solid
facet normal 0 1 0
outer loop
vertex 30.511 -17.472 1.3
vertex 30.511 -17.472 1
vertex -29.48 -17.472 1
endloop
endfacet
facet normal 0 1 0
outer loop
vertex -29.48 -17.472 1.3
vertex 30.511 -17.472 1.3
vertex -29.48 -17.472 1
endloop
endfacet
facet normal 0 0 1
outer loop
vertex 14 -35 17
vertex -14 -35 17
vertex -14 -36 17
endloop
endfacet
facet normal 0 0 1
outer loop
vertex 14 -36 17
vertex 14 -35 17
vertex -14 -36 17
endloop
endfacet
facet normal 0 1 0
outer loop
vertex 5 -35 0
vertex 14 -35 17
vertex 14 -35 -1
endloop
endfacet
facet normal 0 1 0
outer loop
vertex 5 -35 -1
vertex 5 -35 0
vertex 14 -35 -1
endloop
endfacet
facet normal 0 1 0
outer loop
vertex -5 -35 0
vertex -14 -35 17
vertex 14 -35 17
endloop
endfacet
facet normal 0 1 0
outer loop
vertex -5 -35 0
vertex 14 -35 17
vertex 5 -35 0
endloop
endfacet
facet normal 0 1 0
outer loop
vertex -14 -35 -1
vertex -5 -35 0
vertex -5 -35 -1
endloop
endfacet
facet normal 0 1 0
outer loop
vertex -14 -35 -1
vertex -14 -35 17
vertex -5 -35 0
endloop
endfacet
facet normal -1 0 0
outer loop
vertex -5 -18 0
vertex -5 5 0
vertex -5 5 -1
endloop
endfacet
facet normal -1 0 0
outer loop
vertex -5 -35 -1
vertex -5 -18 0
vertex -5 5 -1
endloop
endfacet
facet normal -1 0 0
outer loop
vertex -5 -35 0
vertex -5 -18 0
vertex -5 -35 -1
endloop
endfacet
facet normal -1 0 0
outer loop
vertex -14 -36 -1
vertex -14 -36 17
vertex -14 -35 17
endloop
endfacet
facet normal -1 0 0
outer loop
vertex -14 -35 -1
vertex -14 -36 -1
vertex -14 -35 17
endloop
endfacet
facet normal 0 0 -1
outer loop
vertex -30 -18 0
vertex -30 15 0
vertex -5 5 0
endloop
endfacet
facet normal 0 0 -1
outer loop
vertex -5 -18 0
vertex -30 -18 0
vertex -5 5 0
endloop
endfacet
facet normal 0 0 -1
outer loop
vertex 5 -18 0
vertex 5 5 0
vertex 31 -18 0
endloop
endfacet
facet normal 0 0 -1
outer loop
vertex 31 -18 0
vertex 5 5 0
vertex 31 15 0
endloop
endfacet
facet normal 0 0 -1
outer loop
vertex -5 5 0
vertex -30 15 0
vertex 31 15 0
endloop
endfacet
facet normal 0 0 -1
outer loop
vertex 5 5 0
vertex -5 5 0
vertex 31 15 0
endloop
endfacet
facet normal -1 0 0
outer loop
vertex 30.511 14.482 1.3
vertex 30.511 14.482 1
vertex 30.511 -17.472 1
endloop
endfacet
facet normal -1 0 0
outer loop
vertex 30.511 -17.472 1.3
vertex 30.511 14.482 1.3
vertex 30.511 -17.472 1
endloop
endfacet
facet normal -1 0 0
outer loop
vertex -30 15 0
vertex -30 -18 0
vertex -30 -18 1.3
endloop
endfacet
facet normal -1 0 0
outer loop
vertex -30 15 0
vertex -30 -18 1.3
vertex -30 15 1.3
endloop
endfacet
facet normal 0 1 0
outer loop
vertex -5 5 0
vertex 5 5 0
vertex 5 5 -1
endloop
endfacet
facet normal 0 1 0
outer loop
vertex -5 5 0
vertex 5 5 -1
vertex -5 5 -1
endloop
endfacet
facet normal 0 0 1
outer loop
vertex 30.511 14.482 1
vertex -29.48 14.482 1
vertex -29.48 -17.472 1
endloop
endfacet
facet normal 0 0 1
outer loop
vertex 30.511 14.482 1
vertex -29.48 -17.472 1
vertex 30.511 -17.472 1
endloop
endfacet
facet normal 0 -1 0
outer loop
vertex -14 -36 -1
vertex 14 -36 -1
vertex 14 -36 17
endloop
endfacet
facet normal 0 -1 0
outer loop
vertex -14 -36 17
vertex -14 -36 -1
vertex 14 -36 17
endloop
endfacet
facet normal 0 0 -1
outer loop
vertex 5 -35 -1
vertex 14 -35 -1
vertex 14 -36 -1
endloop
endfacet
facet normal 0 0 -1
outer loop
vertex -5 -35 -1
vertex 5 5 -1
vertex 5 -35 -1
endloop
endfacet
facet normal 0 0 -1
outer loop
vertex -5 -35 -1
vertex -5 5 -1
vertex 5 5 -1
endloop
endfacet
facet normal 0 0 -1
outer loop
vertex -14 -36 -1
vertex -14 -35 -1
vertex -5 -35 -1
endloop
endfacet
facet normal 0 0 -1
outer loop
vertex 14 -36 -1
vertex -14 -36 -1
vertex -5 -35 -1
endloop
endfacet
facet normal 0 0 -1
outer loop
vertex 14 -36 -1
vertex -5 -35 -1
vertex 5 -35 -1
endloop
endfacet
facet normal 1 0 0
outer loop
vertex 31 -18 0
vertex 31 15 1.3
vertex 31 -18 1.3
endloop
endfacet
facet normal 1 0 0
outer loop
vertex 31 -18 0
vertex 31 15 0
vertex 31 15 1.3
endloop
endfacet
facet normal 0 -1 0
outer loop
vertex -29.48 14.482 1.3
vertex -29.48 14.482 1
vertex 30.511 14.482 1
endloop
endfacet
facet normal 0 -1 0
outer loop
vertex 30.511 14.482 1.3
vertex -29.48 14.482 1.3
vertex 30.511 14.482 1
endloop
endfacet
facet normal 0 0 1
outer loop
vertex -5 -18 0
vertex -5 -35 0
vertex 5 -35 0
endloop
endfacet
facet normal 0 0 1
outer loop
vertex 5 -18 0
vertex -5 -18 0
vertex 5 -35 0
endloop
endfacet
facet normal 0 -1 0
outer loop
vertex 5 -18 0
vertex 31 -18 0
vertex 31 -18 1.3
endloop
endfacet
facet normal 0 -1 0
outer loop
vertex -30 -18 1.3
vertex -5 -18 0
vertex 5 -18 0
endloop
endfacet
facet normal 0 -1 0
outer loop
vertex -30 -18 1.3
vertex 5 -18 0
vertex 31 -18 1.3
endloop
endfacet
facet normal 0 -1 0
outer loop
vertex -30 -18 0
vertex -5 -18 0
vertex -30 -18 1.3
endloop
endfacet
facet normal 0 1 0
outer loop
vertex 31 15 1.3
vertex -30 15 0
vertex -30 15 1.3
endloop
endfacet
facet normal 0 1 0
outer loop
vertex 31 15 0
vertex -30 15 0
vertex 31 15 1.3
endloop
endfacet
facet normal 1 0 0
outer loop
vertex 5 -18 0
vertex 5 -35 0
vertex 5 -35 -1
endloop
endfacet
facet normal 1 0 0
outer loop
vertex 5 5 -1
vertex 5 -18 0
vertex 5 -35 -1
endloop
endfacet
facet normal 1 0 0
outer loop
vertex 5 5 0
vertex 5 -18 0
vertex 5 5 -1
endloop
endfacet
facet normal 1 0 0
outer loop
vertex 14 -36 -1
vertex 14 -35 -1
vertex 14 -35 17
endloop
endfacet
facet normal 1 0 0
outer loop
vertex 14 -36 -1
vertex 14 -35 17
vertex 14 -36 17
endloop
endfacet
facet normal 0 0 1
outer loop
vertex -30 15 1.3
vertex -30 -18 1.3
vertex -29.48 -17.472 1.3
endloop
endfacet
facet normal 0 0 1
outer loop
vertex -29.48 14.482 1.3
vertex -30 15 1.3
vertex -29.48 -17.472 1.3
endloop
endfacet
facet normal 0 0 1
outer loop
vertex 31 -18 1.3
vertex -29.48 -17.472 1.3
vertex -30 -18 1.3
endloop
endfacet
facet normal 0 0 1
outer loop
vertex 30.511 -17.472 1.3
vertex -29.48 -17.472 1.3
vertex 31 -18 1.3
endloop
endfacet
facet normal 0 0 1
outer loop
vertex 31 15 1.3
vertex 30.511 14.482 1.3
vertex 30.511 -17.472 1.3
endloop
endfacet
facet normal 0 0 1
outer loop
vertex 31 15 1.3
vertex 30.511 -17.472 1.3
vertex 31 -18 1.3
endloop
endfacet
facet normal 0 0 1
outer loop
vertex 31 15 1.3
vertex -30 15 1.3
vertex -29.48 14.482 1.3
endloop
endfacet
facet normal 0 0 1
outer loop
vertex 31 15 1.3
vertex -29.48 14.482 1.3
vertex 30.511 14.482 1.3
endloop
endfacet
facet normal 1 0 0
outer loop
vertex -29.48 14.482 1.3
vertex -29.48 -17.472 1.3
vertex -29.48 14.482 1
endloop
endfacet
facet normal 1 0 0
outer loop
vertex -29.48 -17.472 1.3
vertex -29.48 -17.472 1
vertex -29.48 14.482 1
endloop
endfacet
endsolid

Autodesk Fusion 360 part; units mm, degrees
sketch "Sketch1" plane through (0, 0, 0) normal (0, 0, 1) x (1, 0, 0)
  line L0 (-30, 15) -> (31, 15)
  line L1 (31, 15) -> (31, -18)
  line L2 (31, -18) -> (-30, -18)
  line L3 (-30, -18) -> (-30, 15)
  line L4 (-29.48, 14.4823) -> (30.5108, 14.4823)
  line L5 (30.5108, 14.4823) -> (30.5108, -17.4715)
  line L6 (30.5108, -17.4715) -> (-29.48, -17.4715)
  line L7 (-29.48, -17.4715) -> (-29.48, 14.4823)
extrude "Extrude1" add sketch "Sketch1" along normal blind 1.3
sketch "Sketch2" plane through (0, 0, 0) normal (0, 0, 1) x (1, 0, 0)
  line L0 (30.5108, -17.4715) -> (-29.48, -17.4715)
  line L1 (-29.48, -17.4715) -> (-29.48, 14.4823)
  line L2 (-29.48, 14.4823) -> (30.5108, 14.4823)
  line L3 (30.5108, 14.4823) -> (30.5108, -17.4715)
  point P0 (30.5108, -17.4715)
  point P1 (-29.48, 14.4823)
extrude "Extrude2" add sketch "Sketch2" along normal blind 1
sketch "Sketch3" plane through (0, 0, 0) normal (0, 0, -1) x (1, 0, 0)
  line L0 (31, 18) -> (-30, 18)
  line L1 (-30, 18) -> (-30, -15)
  line L2 (-30, -15) -> (31, -15)
  line L3 (31, -15) -> (31, 18)
  line L4 (5, -5) -> (-5, -5)
  line L5 (-5, -5) -> (-5, 35)
  line L6 (-5, 35) -> (5, 35)
  line L7 (5, 35) -> (5, -5)
extrude "Extrude3" add sketch "Sketch3" along normal blind 1 contours L0 L4 L5 L7 | L0 L5 L6 L7
sketch "Sketch4" plane through (0, 0, 0) normal (0, 0, -1) x (1, 0, 0)
  line L0 (-5, -5) -> (-5, 18)
  line L1 (-5, 18) -> (-30, 18)
  line L2 (-30, 18) -> (-30, -15)
  line L3 (-30, -15) -> (31, -15)
  line L4 (31, -15) -> (31, 18)
  line L5 (31, 18) -> (5, 18)
  line L6 (5, 18) -> (5, -5)
  line L7 (5, -5) -> (-5, -5)
sketch "Sketch5" plane through (0, 0, 0) normal (0, 1, 0) x (1, 0, 0)
sketch "Sketch6" plane through (0, 0, 1) normal (0, 0, 1) x (-1, 0, 0)
  line L0 (-30.5108, -14.4823) -> (29.48, -14.4823)
  line L1 (29.48, -14.4823) -> (29.48, 17.4715)
  line L2 (29.48, 17.4715) -> (-30.5108, 17.4715)
  line L3 (-30.5108, 17.4715) -> (-30.5108, -14.4823)
  line L4 (20, 11) -> (-20, 11) construction
  line L5 (-20, 11) -> (-20, -10) construction
  line L6 (-20, -10) -> (20, -10) construction
  line L7 (20, -10) -> (20, 11) construction
  dimension "d7" = 5
sketch "Sketch7" plane through (0, 0, 0) normal (1, 0, 0) x (0, 1, 0)
sketch "Sketch8" plane through (0, 0, 0) normal (0, 0, 1) x (1, 0, 0)
  line L0 (-14, -35) -> (13, -35)
  line L1 (13, -35) -> (13, -36)
  line L2 (13, -36) -> (-14, -36)
  line L3 (-14, -36) -> (-14, -35)
extrude "Extrude4" add sketch "Sketch8" along normal blind 17
extrude "Extrude5" add 1 faces at (-2, -35.6667, 0) along direction (0, 0, -1) blind 1
extrude "Extrude6" add 1 faces at (13, -35.3333, 11) along direction (1, 0, 0) blind 1
